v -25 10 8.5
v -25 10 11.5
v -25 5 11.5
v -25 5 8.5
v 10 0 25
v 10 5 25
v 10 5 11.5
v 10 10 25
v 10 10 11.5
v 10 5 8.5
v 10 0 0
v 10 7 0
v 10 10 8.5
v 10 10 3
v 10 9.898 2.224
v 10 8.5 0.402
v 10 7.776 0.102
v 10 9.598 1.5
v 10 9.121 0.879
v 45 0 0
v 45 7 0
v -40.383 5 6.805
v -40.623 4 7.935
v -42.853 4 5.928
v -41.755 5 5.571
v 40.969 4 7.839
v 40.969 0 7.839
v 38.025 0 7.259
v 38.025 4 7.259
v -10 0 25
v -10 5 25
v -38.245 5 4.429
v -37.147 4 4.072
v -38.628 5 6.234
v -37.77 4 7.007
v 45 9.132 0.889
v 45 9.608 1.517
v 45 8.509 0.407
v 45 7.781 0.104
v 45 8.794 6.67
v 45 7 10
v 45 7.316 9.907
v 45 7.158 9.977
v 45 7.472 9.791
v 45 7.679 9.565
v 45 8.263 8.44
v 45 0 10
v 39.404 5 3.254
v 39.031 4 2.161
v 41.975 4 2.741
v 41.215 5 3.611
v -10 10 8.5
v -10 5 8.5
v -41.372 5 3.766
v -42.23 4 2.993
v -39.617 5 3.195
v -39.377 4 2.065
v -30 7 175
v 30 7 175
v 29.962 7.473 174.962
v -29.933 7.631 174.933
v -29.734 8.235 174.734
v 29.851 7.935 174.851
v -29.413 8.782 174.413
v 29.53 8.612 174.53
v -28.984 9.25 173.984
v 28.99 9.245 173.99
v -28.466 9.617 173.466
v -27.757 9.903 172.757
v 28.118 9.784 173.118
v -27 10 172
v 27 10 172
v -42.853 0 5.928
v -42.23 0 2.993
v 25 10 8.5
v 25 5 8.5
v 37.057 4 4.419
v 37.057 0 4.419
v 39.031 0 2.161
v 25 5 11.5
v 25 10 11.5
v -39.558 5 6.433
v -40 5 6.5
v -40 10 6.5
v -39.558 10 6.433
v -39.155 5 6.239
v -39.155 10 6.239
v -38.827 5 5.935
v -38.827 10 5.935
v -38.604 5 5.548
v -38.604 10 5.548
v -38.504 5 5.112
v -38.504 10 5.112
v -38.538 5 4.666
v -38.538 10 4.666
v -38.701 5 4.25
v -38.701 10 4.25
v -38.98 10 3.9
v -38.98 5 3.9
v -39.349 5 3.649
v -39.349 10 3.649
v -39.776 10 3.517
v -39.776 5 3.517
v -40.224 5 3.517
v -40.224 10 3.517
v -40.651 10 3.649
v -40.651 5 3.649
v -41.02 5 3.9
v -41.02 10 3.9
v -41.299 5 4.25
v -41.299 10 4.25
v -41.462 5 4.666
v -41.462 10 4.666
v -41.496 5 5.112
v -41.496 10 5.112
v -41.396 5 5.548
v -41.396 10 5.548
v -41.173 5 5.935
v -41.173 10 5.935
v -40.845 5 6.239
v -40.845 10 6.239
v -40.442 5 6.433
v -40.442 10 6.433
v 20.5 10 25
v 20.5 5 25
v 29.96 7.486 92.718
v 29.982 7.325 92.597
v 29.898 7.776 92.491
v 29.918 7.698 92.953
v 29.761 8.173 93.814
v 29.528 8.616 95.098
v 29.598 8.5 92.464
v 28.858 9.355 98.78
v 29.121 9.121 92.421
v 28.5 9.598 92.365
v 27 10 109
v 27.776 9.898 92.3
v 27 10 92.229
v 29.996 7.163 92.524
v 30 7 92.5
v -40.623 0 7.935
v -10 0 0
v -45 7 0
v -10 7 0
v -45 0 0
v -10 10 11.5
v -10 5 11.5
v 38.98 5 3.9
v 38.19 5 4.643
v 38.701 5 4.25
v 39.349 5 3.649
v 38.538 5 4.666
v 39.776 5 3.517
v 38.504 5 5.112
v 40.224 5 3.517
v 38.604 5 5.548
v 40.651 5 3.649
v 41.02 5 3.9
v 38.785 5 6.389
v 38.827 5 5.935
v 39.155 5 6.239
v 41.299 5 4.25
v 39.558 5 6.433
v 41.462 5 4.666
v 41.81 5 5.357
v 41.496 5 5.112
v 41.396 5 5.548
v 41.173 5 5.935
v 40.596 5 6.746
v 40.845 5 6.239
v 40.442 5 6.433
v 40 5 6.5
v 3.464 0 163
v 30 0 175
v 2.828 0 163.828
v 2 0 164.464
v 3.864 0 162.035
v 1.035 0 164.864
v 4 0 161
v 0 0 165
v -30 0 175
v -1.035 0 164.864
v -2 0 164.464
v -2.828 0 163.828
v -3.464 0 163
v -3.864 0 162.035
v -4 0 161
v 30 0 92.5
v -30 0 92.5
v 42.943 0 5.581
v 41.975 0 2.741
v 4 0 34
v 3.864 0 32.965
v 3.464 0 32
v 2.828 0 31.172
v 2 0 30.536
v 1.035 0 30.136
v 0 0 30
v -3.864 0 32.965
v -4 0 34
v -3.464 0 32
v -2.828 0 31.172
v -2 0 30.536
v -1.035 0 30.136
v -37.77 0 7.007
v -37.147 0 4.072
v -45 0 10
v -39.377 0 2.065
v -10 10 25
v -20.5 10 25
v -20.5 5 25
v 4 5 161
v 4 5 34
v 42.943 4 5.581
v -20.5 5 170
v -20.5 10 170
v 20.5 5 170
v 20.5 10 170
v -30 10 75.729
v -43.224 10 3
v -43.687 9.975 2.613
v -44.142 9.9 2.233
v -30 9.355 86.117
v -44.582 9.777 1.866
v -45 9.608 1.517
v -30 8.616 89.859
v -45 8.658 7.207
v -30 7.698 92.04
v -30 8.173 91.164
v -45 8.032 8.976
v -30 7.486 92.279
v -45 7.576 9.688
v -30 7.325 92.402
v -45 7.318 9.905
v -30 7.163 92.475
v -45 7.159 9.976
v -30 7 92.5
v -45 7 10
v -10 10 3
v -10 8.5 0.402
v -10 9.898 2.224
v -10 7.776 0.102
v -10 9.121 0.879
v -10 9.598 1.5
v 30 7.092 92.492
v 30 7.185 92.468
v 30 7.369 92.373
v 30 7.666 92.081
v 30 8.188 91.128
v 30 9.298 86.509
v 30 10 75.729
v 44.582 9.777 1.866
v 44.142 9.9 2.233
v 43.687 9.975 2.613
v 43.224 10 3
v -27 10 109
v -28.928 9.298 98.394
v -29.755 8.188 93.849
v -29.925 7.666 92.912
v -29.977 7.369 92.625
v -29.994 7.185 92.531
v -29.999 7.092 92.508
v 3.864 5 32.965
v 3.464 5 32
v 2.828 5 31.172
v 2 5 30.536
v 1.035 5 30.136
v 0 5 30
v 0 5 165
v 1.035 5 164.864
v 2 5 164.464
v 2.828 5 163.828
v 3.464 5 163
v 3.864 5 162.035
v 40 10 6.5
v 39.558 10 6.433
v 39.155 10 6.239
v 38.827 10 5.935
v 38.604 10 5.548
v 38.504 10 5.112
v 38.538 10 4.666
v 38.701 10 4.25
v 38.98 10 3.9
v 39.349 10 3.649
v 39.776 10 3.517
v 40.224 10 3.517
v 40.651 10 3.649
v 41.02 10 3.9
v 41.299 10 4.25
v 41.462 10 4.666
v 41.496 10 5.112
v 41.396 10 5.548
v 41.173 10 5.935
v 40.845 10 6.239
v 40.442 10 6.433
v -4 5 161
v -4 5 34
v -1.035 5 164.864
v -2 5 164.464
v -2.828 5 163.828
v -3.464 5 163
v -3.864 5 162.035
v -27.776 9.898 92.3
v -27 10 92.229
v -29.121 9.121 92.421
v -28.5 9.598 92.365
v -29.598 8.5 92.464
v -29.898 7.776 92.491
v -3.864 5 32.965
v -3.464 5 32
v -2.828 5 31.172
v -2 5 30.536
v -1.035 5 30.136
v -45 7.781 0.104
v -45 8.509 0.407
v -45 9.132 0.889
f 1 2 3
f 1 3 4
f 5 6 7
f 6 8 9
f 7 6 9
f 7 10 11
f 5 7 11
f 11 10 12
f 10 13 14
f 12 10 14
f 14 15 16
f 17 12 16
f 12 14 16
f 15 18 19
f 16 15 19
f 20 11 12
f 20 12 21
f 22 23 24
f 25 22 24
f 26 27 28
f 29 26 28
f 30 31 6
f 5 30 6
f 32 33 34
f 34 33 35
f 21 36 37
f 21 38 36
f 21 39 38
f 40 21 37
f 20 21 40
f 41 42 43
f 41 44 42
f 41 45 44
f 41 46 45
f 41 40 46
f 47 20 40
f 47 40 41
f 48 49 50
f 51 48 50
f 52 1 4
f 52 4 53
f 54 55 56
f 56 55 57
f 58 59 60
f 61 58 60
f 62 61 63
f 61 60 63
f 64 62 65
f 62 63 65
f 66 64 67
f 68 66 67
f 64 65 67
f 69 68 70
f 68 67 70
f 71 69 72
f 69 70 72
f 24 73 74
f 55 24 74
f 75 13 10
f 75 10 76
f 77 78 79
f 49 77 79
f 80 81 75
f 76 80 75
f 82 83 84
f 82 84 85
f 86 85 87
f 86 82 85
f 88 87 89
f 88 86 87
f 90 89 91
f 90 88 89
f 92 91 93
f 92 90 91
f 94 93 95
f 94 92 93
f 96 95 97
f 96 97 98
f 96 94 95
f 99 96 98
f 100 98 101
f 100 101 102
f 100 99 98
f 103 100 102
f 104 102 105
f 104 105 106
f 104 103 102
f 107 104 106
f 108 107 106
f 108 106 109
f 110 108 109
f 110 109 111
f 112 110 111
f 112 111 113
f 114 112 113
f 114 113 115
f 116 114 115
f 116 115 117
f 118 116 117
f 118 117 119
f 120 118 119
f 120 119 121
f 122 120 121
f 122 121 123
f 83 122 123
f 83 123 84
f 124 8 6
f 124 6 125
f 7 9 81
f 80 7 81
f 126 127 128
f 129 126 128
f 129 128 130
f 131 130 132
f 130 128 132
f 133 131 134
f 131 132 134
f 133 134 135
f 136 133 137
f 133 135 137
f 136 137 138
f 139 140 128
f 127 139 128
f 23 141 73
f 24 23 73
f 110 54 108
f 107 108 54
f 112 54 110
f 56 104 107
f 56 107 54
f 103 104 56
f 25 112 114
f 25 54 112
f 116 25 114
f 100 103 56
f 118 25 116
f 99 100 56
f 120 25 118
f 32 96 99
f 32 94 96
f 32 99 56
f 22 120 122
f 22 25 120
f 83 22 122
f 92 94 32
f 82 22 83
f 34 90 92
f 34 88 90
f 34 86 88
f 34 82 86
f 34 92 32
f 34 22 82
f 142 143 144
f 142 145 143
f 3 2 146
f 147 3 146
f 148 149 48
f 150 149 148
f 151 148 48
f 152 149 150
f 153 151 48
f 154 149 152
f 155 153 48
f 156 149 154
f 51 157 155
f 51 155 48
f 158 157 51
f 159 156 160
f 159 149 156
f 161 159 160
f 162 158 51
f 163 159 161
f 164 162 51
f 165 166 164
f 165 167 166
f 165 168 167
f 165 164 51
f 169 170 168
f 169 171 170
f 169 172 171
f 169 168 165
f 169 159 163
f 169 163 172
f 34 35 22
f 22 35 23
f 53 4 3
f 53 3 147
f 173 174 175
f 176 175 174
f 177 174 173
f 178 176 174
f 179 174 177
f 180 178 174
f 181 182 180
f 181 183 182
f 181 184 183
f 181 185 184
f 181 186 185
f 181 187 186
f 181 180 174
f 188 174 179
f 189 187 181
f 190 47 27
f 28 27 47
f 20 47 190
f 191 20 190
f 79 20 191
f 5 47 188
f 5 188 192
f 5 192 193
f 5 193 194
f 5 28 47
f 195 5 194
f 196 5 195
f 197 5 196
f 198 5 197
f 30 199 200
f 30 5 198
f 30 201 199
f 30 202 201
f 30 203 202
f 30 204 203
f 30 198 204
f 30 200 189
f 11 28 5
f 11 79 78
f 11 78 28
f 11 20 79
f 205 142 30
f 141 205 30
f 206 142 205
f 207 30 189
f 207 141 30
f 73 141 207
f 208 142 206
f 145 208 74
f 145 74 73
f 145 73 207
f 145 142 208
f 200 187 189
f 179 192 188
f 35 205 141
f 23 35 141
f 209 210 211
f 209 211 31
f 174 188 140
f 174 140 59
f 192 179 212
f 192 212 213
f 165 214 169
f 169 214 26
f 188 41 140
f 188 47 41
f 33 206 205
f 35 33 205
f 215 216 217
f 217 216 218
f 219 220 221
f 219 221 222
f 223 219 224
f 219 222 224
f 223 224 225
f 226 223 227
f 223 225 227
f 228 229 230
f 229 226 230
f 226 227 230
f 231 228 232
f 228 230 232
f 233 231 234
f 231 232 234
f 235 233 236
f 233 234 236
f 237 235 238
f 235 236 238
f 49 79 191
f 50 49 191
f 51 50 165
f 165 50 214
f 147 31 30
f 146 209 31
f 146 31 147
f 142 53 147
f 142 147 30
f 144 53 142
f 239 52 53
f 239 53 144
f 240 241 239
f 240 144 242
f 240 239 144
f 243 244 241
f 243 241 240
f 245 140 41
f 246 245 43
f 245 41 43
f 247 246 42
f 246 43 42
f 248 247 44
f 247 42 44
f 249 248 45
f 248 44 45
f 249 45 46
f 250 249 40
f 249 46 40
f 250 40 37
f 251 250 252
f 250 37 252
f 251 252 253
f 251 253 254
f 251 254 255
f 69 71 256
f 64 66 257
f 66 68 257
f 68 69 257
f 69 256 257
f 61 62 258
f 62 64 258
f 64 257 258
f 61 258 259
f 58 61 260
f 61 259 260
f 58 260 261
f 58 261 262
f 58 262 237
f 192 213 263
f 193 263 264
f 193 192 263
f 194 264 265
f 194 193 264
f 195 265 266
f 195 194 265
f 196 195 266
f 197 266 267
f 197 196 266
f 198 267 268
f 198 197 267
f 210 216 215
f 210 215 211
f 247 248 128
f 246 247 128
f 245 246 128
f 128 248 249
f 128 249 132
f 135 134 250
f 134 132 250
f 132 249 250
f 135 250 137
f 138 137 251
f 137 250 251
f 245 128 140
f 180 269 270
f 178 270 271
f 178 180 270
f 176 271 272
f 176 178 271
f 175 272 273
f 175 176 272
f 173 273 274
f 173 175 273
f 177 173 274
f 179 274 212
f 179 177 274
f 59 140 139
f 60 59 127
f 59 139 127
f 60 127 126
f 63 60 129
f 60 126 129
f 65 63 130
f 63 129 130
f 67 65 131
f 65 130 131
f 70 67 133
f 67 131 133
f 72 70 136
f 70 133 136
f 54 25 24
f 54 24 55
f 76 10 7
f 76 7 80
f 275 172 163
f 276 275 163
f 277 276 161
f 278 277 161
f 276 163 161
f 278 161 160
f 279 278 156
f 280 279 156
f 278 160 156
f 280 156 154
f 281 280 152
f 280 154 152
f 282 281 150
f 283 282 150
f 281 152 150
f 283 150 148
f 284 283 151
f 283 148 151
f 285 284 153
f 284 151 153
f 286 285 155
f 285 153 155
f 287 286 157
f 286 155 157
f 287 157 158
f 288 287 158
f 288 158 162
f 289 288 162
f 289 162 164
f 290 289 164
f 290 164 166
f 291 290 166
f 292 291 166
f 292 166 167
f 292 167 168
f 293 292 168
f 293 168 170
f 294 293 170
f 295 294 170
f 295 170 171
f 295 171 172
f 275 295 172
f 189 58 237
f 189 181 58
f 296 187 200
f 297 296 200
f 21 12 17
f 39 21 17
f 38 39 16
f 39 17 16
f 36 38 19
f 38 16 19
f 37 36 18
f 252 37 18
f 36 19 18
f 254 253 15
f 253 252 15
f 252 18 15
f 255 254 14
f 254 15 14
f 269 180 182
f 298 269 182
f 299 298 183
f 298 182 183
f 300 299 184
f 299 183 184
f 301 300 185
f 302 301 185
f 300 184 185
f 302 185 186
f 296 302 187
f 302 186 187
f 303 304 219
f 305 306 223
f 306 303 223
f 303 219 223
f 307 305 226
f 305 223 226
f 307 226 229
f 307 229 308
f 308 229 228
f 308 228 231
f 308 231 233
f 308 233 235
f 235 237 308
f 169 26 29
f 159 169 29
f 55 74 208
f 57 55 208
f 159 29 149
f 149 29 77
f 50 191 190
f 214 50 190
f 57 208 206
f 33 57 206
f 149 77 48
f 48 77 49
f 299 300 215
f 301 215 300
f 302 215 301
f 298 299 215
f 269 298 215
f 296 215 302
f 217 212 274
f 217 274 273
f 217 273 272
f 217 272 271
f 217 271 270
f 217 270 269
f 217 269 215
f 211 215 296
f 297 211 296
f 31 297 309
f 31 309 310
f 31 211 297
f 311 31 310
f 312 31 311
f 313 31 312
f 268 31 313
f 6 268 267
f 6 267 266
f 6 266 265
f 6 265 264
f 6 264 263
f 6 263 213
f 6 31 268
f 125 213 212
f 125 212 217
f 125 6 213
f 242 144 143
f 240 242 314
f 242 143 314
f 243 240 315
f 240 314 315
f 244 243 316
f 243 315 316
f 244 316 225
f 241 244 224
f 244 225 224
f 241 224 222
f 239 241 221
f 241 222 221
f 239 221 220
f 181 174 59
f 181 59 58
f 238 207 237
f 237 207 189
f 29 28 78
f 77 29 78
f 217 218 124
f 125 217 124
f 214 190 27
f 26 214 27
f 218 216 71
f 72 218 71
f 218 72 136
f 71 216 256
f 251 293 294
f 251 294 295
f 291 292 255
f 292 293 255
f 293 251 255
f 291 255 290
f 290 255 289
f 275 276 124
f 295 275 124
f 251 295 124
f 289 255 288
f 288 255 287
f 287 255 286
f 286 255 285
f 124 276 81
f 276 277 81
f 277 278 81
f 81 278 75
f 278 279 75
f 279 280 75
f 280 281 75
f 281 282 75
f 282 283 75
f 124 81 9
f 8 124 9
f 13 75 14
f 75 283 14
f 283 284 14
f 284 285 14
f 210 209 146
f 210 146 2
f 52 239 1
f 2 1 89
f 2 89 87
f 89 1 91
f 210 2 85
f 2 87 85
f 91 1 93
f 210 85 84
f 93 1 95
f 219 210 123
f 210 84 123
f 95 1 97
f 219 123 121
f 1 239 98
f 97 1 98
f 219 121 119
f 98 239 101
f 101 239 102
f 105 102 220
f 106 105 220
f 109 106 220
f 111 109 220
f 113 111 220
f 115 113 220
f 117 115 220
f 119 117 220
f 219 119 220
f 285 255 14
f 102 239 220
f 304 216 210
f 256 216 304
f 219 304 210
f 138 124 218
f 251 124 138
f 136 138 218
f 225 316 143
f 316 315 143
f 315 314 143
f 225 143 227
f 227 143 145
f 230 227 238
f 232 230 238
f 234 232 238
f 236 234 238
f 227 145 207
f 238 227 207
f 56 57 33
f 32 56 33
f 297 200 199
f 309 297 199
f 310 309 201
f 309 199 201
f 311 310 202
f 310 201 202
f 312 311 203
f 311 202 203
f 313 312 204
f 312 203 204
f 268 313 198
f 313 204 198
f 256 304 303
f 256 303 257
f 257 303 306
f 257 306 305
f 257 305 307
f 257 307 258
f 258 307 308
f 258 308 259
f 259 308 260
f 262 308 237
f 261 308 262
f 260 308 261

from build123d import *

# Parameters (mm, degrees)
SKETCH1_R           = 1.5
BOSS_EXTRUDE1_DEPTH = 10
SKETCH2_W           = 20.5
SKETCH2_H           = 145
CUT_EXTRUDE1_DEPTH  = 5
SKETCH3_W           = 20
SKETCH3_H           = 25
CUT_EXTRUDE2_DEPTH  = 181.969610709
SKETCH4_W           = 50
SKETCH4_H           = 3
CUT_EXTRUDE3_DEPTH  = 5
FILLET1_R           = 3
SKETCH6_R           = 1.5
CUT_EXTRUDE4_DEPTH  = 5
CHAMFER2_SIZE       = 1


with BuildPart() as part:
    # Sketch1 → Boss-Extrude1 (new body)
    with BuildSketch(Plane(origin=(0, 0, 0), x_dir=(1, 0, 0), z_dir=(0, 1, 0))):
        with BuildLine():
            Line((0, -30), (0, 0))
            Line((0, 0), (-45, 0))
            Line((-45, 0), (-45, -10))
            Line((-45, -10), (-30, -92.5))
            Line((-30, -92.5), (-30, -175))
            Line((-30, -175), (0, -175))
            Line((0, -175), (0, -165))
            ThreePointArc((0, -165), (-2.828427125, -163.828427125), (-4, -161))
            Line((-4, -161), (-4, -34))
            ThreePointArc((-4, -34), (-2.828427125, -31.171572875), (0, -30))
        make_face()
        with Locations(Location((-40, -5, 0), (0, 0, 270))):
            Circle(SKETCH1_R, mode=Mode.SUBTRACT)
    boss_extrude1 = extrude(amount=BOSS_EXTRUDE1_DEPTH)

    # Sketch2 → Cut-Extrude1 (cut)
    with BuildSketch(Plane(origin=(0, 10, 0), x_dir=(1, 0, 0), z_dir=(0, 1, 0))):
        with Locations((-10.25, -97.5)):
            Rectangle(SKETCH2_W, SKETCH2_H)
    cut_extrude1 = extrude(amount=-CUT_EXTRUDE1_DEPTH, mode=Mode.SUBTRACT)

    # Mirror1: Boss-Extrude1, Cut-Extrude1 across plane
    add(boss_extrude1.mirror(Plane(origin=(0, 0, 0), x_dir=(0, 0, 1), z_dir=(1, 0, 0))))
    add(cut_extrude1.mirror(Plane(origin=(0, 0, 0), x_dir=(0, 0, 1), z_dir=(1, 0, 0))), mode=Mode.SUBTRACT)

    # Sketch3 → Cut-Extrude2 (cut, through all)
    with BuildSketch(Plane(origin=(0, 10, 0), x_dir=(1, 0, 0), z_dir=(0, 1, 0))):
        with Locations((0, -12.5)):
            Rectangle(SKETCH3_W, SKETCH3_H)
    extrude(amount=-CUT_EXTRUDE2_DEPTH, mode=Mode.SUBTRACT)

    # Sketch4 → Cut-Extrude3 (cut)
    with BuildSketch(Plane(origin=(0, 10, 0), x_dir=(1, 0, 0), z_dir=(0, 1, 0))):
        with Locations((0, -10)):
            Rectangle(SKETCH4_W, SKETCH4_H)
    extrude(amount=-CUT_EXTRUDE3_DEPTH, mode=Mode.SUBTRACT)

    # Fillet1
    # the kernel refuses this fillet: 3 mm, written as the material it takes off along each edge
    with BuildSketch(Plane(origin=(-63, 10, 0), x_dir=(0, -1, 0), z_dir=(1, 0, 0)), Plane(origin=(-8, 10, 0), x_dir=(0, -1, 0), z_dir=(1, 0, 0))) as fillet1_piece_1:
        with BuildLine():
            CenterArc((FILLET1_R, -FILLET1_R), FILLET1_R, 90, 90)
            Line((0, -FILLET1_R), (-FILLET1_R * 0.02, -FILLET1_R))
            Line((-FILLET1_R * 0.02, -FILLET1_R), (-FILLET1_R * 0.02, FILLET1_R * 0.02))
            Line((-FILLET1_R * 0.02, FILLET1_R * 0.02), (FILLET1_R, FILLET1_R * 0.02))
            Line((FILLET1_R, FILLET1_R * 0.02), (FILLET1_R, 0))
        make_face()
    extrude(amount=71, mode=Mode.SUBTRACT)
    with BuildSketch(Plane(origin=(-48.219937888, 10, -7.709658382), x_dir=(0, -1, 0), z_dir=(0.1788854381999831, 0, 0.9838699100999075))) as fillet1_piece_2_section:
        with BuildLine():
            CenterArc((FILLET1_R, FILLET1_R), FILLET1_R, 180, 90)
            Line((0, FILLET1_R), (-FILLET1_R * 0.02, FILLET1_R))
            Line((-FILLET1_R * 0.02, FILLET1_R), (-FILLET1_R * 0.02, -FILLET1_R * 0.02))
            Line((-FILLET1_R * 0.02, -FILLET1_R * 0.02), (FILLET1_R, -FILLET1_R * 0.02))
            Line((FILLET1_R, -FILLET1_R * 0.02), (FILLET1_R, 0))
        make_face()
    fillet1_piece_2 = extrude(amount=119.852549156, mode=Mode.PRIVATE)
    fillet1_piece_2 = split(fillet1_piece_2, bisect_by=Plane(origin=(-30, 9.306962758, 40.50367668), z_dir=(-1, 0, 0)), keep=Keep.TOP, mode=Mode.PRIVATE)
    add(fillet1_piece_2, mode=Mode.SUBTRACT)
    with BuildSketch(Plane(origin=(-30, 10, 74.5), x_dir=(0, -1, 0), z_dir=(0, 0, 1))) as fillet1_piece_3_section:
        with BuildLine():
            CenterArc((FILLET1_R, FILLET1_R), FILLET1_R, 180, 90)
            Line((0, FILLET1_R), (-FILLET1_R * 0.02, FILLET1_R))
            Line((-FILLET1_R * 0.02, FILLET1_R), (-FILLET1_R * 0.02, -FILLET1_R * 0.02))
            Line((-FILLET1_R * 0.02, -FILLET1_R * 0.02), (FILLET1_R, -FILLET1_R * 0.02))
            Line((FILLET1_R, -FILLET1_R * 0.02), (FILLET1_R, 0))
        make_face()
    fillet1_piece_3 = extrude(amount=118.5, mode=Mode.PRIVATE)
    fillet1_piece_3 = split(fillet1_piece_3, bisect_by=Plane(origin=(-20.817808359, 9.30676914, 143.002054026), z_dir=(-0.9838699100999075, 0, 0.1788854381999831)), keep=Keep.TOP, mode=Mode.PRIVATE)
    add(fillet1_piece_3, mode=Mode.SUBTRACT)
    with BuildSketch(Plane(origin=(48, 10, 175), x_dir=(0, -1, 0), z_dir=(-1, 0, 0))) as fillet1_piece_4:
        with BuildLine():
            CenterArc((FILLET1_R, -FILLET1_R), FILLET1_R, 90, 90)
            Line((0, -FILLET1_R), (-FILLET1_R * 0.02, -FILLET1_R))
            Line((-FILLET1_R * 0.02, -FILLET1_R), (-FILLET1_R * 0.02, FILLET1_R * 0.02))
            Line((-FILLET1_R * 0.02, FILLET1_R * 0.02), (FILLET1_R, FILLET1_R * 0.02))
            Line((FILLET1_R, FILLET1_R * 0.02), (FILLET1_R, 0))
        make_face()
    extrude(amount=96, mode=Mode.SUBTRACT)
    with BuildSketch(Plane(origin=(30, 10, 74.5), x_dir=(0, -1, 0), z_dir=(0, 0, 1))) as fillet1_piece_5_section:
        with BuildLine():
            CenterArc((FILLET1_R, -FILLET1_R), FILLET1_R, 90, 90)
            Line((0, -FILLET1_R), (-FILLET1_R * 0.02, -FILLET1_R))
            Line((-FILLET1_R * 0.02, -FILLET1_R), (-FILLET1_R * 0.02, FILLET1_R * 0.02))
            Line((-FILLET1_R * 0.02, FILLET1_R * 0.02), (FILLET1_R, FILLET1_R * 0.02))
            Line((FILLET1_R, FILLET1_R * 0.02), (FILLET1_R, 0))
        make_face()
    fillet1_piece_5 = extrude(amount=118.5, mode=Mode.PRIVATE)
    fillet1_piece_5 = split(fillet1_piece_5, bisect_by=Plane(origin=(20.817808359, 9.30676914, 143.002054026), z_dir=(0.9838699100999075, 0, 0.1788854381999831)), keep=Keep.TOP, mode=Mode.PRIVATE)
    add(fillet1_piece_5, mode=Mode.SUBTRACT)
    with BuildSketch(Plane(origin=(48.219937888, 10, -7.709658382), x_dir=(0, -1, 0), z_dir=(-0.1788854381999831, 0, 0.9838699100999075))) as fillet1_piece_6_section:
        with BuildLine():
            CenterArc((FILLET1_R, -FILLET1_R), FILLET1_R, 90, 90)
            Line((0, -FILLET1_R), (-FILLET1_R * 0.02, -FILLET1_R))
            Line((-FILLET1_R * 0.02, -FILLET1_R), (-FILLET1_R * 0.02, FILLET1_R * 0.02))
            Line((-FILLET1_R * 0.02, FILLET1_R * 0.02), (FILLET1_R, FILLET1_R * 0.02))
            Line((FILLET1_R, FILLET1_R * 0.02), (FILLET1_R, 0))
        make_face()
    fillet1_piece_6 = extrude(amount=119.852549156, mode=Mode.PRIVATE)
    fillet1_piece_6 = split(fillet1_piece_6, bisect_by=Plane(origin=(30, 9.306962758, 40.50367668), z_dir=(1, 0, 0)), keep=Keep.TOP, mode=Mode.PRIVATE)
    add(fillet1_piece_6, mode=Mode.SUBTRACT)
    with BuildSketch(Plane(origin=(-30, 10, 74.5), x_dir=(0, -1, 0), z_dir=(0, 0, 1))) as fillet1_piece_7a_section:
        with BuildLine():
            CenterArc((FILLET1_R, FILLET1_R), FILLET1_R, 180, 90)
            Line((0, FILLET1_R), (-FILLET1_R * 0.02, FILLET1_R))
            Line((-FILLET1_R * 0.02, FILLET1_R), (-FILLET1_R * 0.02, -FILLET1_R * 0.02))
            Line((-FILLET1_R * 0.02, -FILLET1_R * 0.02), (FILLET1_R, -FILLET1_R * 0.02))
            Line((FILLET1_R, -FILLET1_R * 0.02), (FILLET1_R, 0))
        make_face()
    fillet1_piece_7a = extrude(amount=118.5, mode=Mode.PRIVATE)
    fillet1_piece_7a = split(fillet1_piece_7a, bisect_by=Plane(origin=(-31.178924404, 9.383343973, 86.015915779), z_dir=(0.9838699100999075, 0, -0.1788854381999831)), keep=Keep.TOP, mode=Mode.PRIVATE)
    with BuildSketch(Plane(origin=(-48.219937888, 10, -7.709658382), x_dir=(0, -1, 0), z_dir=(0.1788854381999831, 0, 0.9838699100999075))) as fillet1_piece_7b_section:
        with BuildLine():
            CenterArc((FILLET1_R, FILLET1_R), FILLET1_R, 180, 90)
            Line((0, FILLET1_R), (-FILLET1_R * 0.02, FILLET1_R))
            Line((-FILLET1_R * 0.02, FILLET1_R), (-FILLET1_R * 0.02, -FILLET1_R * 0.02))
            Line((-FILLET1_R * 0.02, -FILLET1_R * 0.02), (FILLET1_R, -FILLET1_R * 0.02))
            Line((FILLET1_R, -FILLET1_R * 0.02), (FILLET1_R, 0))
        make_face()
    fillet1_piece_7b = extrude(amount=119.852549156, mode=Mode.PRIVATE)
    fillet1_piece_7b = split(fillet1_piece_7b, bisect_by=Plane(origin=(-30, 9.383343973, 99.090387768), z_dir=(1, 0, 0)), keep=Keep.TOP, mode=Mode.PRIVATE)
    fillet1_piece_7 = fillet1_piece_7a & fillet1_piece_7b
    add(fillet1_piece_7, mode=Mode.SUBTRACT)
    with BuildSketch(Plane(origin=(48.219937888, 10, -7.709658382), x_dir=(0, -1, 0), z_dir=(-0.1788854381999831, 0, 0.9838699100999075))) as fillet1_piece_8a_section:
        with BuildLine():
            CenterArc((FILLET1_R, -FILLET1_R), FILLET1_R, 90, 90)
            Line((0, -FILLET1_R), (-FILLET1_R * 0.02, -FILLET1_R))
            Line((-FILLET1_R * 0.02, -FILLET1_R), (-FILLET1_R * 0.02, FILLET1_R * 0.02))
            Line((-FILLET1_R * 0.02, FILLET1_R * 0.02), (FILLET1_R, FILLET1_R * 0.02))
            Line((FILLET1_R, FILLET1_R * 0.02), (FILLET1_R, 0))
        make_face()
    fillet1_piece_8a = extrude(amount=119.852549156, mode=Mode.PRIVATE)
    fillet1_piece_8a = split(fillet1_piece_8a, bisect_by=Plane(origin=(30, 9.383343973, 99.090387768), z_dir=(-1, 0, 0)), keep=Keep.TOP, mode=Mode.PRIVATE)
    with BuildSketch(Plane(origin=(30, 10, 74.5), x_dir=(0, -1, 0), z_dir=(0, 0, 1))) as fillet1_piece_8b_section:
        with BuildLine():
            CenterArc((FILLET1_R, -FILLET1_R), FILLET1_R, 90, 90)
            Line((0, -FILLET1_R), (-FILLET1_R * 0.02, -FILLET1_R))
            Line((-FILLET1_R * 0.02, -FILLET1_R), (-FILLET1_R * 0.02, FILLET1_R * 0.02))
            Line((-FILLET1_R * 0.02, FILLET1_R * 0.02), (FILLET1_R, FILLET1_R * 0.02))
            Line((FILLET1_R, FILLET1_R * 0.02), (FILLET1_R, 0))
        make_face()
    fillet1_piece_8b = extrude(amount=118.5, mode=Mode.PRIVATE)
    fillet1_piece_8b = split(fillet1_piece_8b, bisect_by=Plane(origin=(31.178924404, 9.383343973, 86.015915779), z_dir=(-0.9838699100999075, 0, -0.1788854381999831)), keep=Keep.TOP, mode=Mode.PRIVATE)
    fillet1_piece_8 = fillet1_piece_8a & fillet1_piece_8b
    add(fillet1_piece_8, mode=Mode.SUBTRACT)

    # Sketch6 → Cut-Extrude4 (cut)
    # profile 1 of 2: a face of its own
    with BuildSketch(Plane.XZ):
        Polygon((-42.230176428, 2.993432508), (-39.377349792, 2.065326812), (-37.147173364, 4.071894304), (-37.769823572, 7.006567492), (-40.622650208, 7.934673188), (-42.852826636, 5.928105696), align=None)
        with Locations(Location((-40, 5, 0), (0, 0, 270))):
            Circle(SKETCH6_R, mode=Mode.SUBTRACT)
    # profile 2 of 2: a face of its own
    with BuildSketch(Plane.XZ):
        Polygon((37.056735483, 4.419315936), (39.031254892, 2.160716126), (41.974519409, 2.74140019), (42.943264517, 5.580684064), (40.968745108, 7.839283874), (38.025480591, 7.25859981), align=None)
        with Locations(Location((40, 5, 0), (0, 0, 270))):
            Circle(SKETCH6_R, mode=Mode.SUBTRACT)
    extrude(amount=-CUT_EXTRUDE4_DEPTH, mode=Mode.SUBTRACT)

    # Chamfer2
    chamfer2_edges = [part.edges().sort_by_distance(p)[0] for p in [
        (-40.80376311, 5, 2.52937966),
        (-42.541501532, 5, 4.460769102),
        (-41.737738422, 5, 6.931389442),
        (-39.19623689, 5, 7.47062034),
        (-37.458498468, 5, 5.539230898),
        (-38.262261578, 5, 3.068610558),
        (38.043995187, 5, 3.290016031),
        (37.541108037, 5, 5.838957873),
        (39.497112849, 5, 7.548941842),
        (41.956004813, 5, 6.709983969),
        (42.458891963, 5, 4.161042127),
        (40.502887151, 5, 2.451058158),
    ]]
    chamfer(chamfer2_edges, length=CHAMFER2_SIZE)


solid = part.part
